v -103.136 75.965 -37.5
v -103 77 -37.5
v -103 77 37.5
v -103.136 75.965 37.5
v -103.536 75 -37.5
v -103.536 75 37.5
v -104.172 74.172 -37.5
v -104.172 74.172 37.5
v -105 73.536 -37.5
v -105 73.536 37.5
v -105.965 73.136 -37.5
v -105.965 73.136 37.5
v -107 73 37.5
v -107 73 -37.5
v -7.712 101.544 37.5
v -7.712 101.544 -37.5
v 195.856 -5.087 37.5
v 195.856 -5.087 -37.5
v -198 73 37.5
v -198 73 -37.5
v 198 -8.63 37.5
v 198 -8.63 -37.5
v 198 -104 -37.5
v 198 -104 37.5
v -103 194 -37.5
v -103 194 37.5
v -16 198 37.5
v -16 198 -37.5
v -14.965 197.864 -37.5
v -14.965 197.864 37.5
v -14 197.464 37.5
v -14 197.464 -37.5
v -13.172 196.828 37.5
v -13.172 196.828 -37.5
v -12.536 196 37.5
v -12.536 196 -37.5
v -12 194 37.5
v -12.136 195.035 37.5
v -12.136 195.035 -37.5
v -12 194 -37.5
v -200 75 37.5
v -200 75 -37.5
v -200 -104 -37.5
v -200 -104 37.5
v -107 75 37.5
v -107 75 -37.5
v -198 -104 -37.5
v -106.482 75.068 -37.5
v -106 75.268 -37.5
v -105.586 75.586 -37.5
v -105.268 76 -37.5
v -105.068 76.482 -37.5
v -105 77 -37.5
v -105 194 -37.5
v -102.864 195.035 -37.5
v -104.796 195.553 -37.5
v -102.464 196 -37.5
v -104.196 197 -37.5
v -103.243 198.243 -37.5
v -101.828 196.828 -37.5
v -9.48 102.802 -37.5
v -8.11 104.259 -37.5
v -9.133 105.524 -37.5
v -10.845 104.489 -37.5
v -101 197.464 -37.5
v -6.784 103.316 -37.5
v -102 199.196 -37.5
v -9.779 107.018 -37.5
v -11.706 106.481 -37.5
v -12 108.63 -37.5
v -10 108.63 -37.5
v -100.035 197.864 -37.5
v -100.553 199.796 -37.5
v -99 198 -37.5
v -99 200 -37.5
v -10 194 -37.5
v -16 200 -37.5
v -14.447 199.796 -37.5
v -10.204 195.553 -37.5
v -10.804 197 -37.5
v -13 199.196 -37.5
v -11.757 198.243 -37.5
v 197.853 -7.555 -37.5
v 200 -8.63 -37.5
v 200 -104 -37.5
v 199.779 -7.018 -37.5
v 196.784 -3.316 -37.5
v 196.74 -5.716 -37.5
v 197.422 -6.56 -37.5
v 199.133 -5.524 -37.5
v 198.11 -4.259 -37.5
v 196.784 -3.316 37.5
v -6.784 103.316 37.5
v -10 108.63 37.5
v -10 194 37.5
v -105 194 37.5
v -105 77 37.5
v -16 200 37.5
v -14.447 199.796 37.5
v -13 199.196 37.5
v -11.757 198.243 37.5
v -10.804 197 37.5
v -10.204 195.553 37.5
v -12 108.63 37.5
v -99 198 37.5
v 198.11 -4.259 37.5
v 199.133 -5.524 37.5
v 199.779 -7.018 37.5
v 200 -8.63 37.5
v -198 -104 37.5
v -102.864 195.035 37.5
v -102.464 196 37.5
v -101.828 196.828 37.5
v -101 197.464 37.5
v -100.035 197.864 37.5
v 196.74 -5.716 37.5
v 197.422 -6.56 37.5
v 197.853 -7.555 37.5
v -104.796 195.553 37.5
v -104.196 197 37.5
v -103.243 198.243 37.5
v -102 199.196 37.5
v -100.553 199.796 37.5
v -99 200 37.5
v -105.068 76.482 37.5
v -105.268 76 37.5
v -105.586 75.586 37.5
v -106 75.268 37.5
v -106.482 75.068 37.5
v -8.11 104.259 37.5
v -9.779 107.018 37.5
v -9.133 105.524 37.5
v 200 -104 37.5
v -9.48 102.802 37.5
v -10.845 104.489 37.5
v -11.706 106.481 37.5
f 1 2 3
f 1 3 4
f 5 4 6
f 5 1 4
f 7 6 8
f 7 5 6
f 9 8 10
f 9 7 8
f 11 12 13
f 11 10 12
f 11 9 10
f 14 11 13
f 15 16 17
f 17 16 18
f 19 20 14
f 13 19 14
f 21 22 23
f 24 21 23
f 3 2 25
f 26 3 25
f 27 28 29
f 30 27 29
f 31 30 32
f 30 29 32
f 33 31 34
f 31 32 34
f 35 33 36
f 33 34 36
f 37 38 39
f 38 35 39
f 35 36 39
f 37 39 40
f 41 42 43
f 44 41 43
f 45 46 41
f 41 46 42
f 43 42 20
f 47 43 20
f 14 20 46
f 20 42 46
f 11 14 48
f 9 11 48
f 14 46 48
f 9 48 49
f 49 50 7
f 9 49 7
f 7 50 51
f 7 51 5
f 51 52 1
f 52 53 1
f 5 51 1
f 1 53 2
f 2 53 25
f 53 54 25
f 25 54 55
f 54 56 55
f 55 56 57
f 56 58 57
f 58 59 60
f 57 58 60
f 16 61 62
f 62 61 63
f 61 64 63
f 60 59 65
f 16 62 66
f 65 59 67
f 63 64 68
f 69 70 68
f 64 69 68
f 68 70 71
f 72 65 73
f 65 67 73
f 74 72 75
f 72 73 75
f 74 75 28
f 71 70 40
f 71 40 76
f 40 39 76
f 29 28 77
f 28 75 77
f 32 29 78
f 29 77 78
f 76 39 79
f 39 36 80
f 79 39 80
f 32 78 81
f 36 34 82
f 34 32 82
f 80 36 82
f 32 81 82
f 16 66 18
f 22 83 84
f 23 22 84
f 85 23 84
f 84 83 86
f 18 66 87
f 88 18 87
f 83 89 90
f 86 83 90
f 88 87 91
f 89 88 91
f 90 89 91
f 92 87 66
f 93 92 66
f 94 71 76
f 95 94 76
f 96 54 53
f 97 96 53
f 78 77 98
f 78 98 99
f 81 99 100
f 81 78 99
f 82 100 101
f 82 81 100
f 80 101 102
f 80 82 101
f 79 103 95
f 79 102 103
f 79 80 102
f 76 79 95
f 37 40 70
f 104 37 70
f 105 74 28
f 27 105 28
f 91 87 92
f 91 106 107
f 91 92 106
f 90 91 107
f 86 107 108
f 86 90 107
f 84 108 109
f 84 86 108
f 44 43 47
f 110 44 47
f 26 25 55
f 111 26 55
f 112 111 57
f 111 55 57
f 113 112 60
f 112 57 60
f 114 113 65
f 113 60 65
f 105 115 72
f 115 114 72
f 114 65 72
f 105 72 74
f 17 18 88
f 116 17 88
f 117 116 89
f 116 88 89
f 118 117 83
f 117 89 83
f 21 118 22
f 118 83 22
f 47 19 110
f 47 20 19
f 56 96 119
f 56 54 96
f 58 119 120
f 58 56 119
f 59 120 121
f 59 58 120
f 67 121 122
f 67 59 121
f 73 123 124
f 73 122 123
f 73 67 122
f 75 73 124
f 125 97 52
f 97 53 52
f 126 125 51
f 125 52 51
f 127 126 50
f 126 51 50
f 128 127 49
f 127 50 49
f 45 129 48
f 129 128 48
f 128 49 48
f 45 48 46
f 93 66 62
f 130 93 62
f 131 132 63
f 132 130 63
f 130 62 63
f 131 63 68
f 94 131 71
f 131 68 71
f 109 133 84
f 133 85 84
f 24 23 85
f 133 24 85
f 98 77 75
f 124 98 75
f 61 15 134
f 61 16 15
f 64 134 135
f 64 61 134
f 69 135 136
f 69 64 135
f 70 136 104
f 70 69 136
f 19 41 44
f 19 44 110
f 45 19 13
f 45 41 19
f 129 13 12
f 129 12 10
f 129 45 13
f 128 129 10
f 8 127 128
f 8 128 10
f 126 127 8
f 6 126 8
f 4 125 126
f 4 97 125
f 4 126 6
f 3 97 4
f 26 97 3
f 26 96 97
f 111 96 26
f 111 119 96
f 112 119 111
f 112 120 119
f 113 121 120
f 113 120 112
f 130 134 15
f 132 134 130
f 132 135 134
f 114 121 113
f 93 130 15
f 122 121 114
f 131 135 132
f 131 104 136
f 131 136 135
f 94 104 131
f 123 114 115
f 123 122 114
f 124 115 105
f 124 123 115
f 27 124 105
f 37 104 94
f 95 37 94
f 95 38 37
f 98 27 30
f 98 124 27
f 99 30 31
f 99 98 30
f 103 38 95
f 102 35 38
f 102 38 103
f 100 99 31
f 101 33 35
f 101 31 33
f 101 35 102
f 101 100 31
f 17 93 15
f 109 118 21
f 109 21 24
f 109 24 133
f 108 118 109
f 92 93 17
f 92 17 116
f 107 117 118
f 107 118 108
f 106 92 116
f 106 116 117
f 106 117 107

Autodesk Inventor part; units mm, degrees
ref_plane "YZ Plane" through (0, 0, 0) normal (1, 0, 0) x (0, 1, 0)
ref_plane "XZ Plane" through (0, 0, 0) normal (0, 1, 0) x (-1, 0, 0)
ref_plane "XY Plane" through (0, 0, 0) normal (0, 0, 1) x (1, 0, 0)
sketch "Boceto1" plane through (0, 0, 0) normal (0, 0, 1) x (1, 0, 0)
  line L0 (200, -104) -> (200, -8.6304)
  arc A0 (200, -8.6304) -> (196.784, -3.3155) centre (194, -8.6304) ccw
  line L1 (196.784, -3.3155) -> (-6.784, 103.3155)
  arc A1 (-10, 108.6304) -> (-6.784, 103.3155) centre (-4, 108.6304) ccw
  line L2 (-10, 108.6304) -> (-10, 194)
  arc A2 (-10, 194) -> (-16, 200) centre (-16, 194) ccw
  line L3 (-16, 200) -> (-99, 200)
  arc A3 (-99, 200) -> (-105, 194) centre (-99, 194) ccw
  line L4 (-105, 194) -> (-105, 77)
  arc A4 (-107, 75) -> (-105, 77) centre (-107, 77) ccw
  line L5 (-107, 75) -> (-173, 75)
  arc A5 (-175, 123) -> (-177, 125) centre (-177, 123) ccw
  line L6 (-200, 75) -> (-200, -104)
  line L7 (-173, 75) -> (-200, 75)
  line L8 (-198, 73) -> (-173, 73)
  line L9 (-173, 73) -> (-107, 73)
  arc A6 (-107, 73) -> (-103, 77) centre (-107, 77) ccw
  line L10 (-103, 77) -> (-103, 194)
  arc A7 (-99, 198) -> (-103, 194) centre (-99, 194) ccw
  line L11 (-99, 198) -> (-16, 198)
  arc A8 (-12, 194) -> (-16, 198) centre (-16, 194) ccw
  line L12 (-12, 194) -> (-12, 108.6304)
  arc A9 (-12, 108.6304) -> (-7.7121, 101.5438) centre (-4, 108.6304) ccw
  line L13 (-7.7121, 101.5438) -> (195.856, -5.0871)
  arc A10 (198, -8.6304) -> (195.856, -5.0871) centre (194, -8.6304) ccw
  line L14 (198, -8.6304) -> (198, -104)
  line L15 (-198, 73) -> (-198, -104)
  line L16 (-200, -104) -> (-198, -104)
  line L17 (198, -104) -> (200, -104)
  point P0 (0, 0)
  dimension "d3" = 2
  dimension "d4" = 2
extrude "Extrusión1" add sketch "Boceto1" along normal mid plane 75
properties part number "INTERNAL FRAME" material "Acero, carbono"
